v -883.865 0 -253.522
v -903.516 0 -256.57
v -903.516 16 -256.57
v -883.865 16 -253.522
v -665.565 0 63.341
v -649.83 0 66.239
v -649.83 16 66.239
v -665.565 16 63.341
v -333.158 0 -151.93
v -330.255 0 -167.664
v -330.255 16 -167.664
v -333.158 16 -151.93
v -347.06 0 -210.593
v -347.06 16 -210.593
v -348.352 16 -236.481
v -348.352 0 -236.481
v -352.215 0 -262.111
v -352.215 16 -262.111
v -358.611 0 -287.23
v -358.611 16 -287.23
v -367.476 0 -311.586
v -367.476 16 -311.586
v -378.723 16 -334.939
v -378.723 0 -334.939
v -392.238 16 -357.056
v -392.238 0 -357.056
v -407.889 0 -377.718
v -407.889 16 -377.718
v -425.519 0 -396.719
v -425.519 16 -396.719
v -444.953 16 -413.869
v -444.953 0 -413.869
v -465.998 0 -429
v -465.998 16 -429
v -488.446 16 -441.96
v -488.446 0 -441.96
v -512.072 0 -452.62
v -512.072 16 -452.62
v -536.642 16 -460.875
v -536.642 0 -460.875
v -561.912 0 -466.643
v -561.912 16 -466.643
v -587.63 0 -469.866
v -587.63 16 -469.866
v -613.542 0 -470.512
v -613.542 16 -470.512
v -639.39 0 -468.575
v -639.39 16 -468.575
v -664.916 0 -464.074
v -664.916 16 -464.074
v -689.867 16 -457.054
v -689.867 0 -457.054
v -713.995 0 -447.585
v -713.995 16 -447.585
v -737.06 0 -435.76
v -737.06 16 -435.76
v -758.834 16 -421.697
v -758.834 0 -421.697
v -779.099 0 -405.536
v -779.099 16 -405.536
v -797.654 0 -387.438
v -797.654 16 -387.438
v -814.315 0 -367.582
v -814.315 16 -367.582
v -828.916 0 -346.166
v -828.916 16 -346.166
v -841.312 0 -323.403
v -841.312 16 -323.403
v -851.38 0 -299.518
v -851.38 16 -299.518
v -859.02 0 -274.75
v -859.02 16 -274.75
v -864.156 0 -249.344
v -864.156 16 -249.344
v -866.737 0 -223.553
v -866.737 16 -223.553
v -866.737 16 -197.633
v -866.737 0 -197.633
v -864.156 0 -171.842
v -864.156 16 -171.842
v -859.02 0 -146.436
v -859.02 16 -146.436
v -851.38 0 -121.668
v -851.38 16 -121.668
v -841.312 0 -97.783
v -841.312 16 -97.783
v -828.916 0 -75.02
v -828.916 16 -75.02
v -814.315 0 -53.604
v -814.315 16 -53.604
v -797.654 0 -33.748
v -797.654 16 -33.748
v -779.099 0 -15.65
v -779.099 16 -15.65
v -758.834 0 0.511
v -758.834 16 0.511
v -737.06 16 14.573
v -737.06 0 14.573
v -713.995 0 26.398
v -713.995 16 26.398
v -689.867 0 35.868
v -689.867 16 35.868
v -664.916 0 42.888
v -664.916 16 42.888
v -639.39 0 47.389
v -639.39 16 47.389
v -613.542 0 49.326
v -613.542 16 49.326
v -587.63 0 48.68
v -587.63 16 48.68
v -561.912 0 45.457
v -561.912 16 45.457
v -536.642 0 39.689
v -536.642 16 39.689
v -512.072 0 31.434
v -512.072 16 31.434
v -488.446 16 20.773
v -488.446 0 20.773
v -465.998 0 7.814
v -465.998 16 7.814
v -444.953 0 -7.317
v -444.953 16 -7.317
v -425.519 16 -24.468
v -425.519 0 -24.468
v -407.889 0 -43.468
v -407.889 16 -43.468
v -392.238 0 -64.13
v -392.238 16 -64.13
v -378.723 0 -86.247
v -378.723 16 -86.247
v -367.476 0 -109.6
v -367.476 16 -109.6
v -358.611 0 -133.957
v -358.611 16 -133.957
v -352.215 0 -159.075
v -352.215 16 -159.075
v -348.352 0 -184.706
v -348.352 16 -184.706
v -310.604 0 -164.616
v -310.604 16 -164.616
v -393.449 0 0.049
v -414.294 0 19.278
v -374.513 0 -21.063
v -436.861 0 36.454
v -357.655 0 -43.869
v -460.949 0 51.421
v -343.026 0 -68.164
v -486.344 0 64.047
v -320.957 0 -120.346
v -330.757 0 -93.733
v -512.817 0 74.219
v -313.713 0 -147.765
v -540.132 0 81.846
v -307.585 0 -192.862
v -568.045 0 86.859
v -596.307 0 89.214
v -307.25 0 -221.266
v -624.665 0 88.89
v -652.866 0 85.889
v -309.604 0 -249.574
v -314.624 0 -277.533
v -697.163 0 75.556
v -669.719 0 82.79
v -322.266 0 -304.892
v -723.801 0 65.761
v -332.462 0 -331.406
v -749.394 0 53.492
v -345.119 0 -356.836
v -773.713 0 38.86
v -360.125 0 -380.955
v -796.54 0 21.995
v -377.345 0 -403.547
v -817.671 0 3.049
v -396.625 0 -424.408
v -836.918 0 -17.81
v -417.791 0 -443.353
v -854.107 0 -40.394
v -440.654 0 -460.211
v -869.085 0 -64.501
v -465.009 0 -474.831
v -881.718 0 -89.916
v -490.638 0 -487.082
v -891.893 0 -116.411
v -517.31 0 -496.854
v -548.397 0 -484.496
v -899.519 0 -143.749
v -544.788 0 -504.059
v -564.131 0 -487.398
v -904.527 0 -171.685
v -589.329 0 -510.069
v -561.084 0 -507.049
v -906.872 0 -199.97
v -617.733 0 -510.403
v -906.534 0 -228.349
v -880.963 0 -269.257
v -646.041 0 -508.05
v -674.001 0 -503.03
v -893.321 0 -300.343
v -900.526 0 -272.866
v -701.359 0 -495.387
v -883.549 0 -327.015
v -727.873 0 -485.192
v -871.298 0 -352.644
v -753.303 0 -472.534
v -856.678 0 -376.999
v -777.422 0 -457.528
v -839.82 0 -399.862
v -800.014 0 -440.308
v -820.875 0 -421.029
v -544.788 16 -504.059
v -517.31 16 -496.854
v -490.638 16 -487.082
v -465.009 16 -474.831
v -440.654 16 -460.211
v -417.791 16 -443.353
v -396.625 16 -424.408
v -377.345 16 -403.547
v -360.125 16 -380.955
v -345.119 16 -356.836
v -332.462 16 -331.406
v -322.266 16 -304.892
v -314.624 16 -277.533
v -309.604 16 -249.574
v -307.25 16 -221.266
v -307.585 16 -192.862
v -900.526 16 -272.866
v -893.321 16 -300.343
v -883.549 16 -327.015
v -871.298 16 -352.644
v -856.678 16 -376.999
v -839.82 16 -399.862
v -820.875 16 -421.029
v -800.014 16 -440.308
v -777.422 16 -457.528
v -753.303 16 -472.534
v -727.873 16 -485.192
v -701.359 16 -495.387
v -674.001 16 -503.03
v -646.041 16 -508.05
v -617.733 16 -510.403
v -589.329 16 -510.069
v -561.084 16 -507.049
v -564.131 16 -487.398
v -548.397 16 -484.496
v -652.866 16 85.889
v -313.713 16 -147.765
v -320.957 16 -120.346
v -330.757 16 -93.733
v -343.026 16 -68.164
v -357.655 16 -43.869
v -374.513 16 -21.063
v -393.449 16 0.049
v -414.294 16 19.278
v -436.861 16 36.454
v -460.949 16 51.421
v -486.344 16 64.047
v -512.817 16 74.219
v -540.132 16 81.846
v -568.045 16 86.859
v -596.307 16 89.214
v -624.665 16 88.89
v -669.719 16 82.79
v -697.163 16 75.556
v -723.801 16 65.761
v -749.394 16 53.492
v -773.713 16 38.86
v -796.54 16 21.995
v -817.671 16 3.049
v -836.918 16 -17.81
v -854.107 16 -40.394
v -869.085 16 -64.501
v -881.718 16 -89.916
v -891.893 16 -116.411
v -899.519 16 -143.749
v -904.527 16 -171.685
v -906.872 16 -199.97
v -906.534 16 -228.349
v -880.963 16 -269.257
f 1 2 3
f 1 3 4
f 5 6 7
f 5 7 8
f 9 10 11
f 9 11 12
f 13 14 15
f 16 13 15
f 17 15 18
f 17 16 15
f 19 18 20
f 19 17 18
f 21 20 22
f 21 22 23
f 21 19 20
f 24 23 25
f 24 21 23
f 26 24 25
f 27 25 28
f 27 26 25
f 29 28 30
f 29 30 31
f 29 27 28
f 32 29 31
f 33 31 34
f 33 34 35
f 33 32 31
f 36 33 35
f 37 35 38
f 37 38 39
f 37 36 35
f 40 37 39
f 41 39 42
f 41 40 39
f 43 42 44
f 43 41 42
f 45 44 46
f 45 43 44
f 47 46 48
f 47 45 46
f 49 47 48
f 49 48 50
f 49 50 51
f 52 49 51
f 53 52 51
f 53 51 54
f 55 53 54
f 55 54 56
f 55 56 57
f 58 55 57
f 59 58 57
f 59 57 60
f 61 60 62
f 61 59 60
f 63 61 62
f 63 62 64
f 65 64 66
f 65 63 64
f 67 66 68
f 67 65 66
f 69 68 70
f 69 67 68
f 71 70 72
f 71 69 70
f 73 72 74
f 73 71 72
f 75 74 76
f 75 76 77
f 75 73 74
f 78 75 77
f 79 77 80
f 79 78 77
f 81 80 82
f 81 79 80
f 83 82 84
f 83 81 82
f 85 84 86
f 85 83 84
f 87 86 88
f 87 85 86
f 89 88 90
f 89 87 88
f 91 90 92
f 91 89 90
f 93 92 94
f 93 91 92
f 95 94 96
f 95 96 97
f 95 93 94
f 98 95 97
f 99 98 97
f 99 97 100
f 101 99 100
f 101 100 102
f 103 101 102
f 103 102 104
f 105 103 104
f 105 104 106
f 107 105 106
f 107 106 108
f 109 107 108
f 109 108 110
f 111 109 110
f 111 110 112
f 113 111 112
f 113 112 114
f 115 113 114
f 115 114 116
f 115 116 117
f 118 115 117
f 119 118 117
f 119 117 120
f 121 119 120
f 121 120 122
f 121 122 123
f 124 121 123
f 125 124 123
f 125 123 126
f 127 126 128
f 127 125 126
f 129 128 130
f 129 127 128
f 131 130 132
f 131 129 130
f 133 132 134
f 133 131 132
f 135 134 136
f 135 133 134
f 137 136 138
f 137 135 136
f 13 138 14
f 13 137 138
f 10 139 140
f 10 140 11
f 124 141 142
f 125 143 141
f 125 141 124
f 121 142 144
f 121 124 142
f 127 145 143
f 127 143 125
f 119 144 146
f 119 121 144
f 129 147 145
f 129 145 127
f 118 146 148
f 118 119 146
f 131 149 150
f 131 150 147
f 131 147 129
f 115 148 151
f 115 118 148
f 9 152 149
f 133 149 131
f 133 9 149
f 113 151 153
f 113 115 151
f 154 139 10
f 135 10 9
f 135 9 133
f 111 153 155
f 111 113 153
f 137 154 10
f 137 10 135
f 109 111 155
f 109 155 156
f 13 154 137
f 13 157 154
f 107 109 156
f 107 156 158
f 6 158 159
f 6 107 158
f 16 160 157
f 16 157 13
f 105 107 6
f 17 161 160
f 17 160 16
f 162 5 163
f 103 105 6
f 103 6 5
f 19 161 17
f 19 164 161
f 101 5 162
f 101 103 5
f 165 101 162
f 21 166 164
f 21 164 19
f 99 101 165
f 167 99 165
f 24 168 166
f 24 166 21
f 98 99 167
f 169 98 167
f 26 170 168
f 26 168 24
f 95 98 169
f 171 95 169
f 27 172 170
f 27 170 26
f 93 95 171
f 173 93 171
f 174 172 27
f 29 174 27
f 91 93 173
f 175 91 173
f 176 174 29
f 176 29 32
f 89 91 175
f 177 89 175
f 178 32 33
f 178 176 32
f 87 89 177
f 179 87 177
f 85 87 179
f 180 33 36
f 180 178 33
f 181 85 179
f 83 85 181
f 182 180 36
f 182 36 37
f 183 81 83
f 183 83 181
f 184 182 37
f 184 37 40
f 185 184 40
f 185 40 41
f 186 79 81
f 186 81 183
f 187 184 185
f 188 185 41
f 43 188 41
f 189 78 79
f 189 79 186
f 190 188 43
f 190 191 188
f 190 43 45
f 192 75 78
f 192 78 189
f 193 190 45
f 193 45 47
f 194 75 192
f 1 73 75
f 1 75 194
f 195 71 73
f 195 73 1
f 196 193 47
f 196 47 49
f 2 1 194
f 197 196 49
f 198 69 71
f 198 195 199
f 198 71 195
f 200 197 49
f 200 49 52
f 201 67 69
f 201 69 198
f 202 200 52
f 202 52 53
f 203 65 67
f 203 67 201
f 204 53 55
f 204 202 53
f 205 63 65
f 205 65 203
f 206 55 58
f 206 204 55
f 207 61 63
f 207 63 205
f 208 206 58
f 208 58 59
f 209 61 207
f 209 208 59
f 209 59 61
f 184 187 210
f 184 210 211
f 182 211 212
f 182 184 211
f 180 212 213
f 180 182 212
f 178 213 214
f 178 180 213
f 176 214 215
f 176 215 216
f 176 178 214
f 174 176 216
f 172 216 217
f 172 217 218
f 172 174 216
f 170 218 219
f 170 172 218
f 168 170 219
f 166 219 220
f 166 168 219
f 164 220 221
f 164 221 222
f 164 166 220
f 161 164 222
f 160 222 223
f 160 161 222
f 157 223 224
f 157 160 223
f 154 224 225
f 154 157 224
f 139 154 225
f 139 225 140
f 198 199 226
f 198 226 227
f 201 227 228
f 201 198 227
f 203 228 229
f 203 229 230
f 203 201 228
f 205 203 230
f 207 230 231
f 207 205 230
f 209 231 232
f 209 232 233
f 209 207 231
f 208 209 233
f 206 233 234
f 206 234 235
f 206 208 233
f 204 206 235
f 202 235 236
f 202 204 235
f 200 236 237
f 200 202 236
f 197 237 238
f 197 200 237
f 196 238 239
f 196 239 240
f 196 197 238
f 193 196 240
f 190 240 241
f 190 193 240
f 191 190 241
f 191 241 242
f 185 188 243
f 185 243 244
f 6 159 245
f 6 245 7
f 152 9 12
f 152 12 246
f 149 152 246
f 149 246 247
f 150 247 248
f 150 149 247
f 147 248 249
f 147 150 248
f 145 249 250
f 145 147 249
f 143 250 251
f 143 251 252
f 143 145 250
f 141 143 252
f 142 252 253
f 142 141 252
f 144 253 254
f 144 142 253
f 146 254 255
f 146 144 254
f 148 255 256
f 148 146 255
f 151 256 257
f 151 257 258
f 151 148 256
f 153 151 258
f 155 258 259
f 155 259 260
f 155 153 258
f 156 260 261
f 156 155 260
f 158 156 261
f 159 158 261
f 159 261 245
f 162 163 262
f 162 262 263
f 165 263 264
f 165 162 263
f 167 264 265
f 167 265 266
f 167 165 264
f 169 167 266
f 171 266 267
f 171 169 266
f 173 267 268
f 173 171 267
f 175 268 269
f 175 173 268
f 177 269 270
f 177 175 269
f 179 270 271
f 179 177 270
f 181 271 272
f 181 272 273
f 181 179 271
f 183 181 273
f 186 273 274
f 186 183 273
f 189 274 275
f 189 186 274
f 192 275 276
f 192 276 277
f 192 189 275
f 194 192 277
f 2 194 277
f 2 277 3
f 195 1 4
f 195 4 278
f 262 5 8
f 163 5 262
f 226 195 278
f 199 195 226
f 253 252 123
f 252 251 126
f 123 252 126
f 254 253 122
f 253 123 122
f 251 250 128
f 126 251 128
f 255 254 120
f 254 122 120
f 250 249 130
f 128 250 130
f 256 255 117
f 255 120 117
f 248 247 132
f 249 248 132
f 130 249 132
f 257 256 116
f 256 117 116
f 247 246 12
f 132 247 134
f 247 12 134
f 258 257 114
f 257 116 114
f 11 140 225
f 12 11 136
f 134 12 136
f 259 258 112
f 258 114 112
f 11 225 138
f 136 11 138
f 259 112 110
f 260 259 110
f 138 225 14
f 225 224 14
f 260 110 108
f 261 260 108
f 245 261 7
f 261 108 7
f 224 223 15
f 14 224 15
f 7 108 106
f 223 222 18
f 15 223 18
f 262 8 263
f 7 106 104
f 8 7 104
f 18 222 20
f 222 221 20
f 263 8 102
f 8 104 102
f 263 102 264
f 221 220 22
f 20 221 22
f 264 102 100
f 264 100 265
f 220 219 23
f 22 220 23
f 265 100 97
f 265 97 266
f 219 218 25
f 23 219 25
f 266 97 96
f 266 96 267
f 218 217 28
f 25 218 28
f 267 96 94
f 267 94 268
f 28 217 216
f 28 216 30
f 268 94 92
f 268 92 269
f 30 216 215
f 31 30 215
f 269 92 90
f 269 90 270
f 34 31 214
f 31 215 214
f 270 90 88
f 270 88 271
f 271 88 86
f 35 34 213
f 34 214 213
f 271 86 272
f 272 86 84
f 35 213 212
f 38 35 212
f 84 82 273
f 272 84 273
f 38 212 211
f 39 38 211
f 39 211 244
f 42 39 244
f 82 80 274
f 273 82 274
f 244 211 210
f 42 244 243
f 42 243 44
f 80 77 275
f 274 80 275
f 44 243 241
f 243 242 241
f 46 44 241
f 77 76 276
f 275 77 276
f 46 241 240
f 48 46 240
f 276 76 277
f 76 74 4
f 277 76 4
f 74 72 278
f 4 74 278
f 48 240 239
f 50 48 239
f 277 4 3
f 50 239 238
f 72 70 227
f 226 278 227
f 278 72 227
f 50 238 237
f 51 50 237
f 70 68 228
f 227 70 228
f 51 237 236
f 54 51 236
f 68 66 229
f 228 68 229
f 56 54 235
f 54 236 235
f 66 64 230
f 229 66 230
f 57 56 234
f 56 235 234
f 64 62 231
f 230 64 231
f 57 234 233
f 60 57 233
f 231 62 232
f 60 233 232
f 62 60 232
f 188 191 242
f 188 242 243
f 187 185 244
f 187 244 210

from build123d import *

# Parameters (mm, degrees)
SKETCH_1_R      = 260
EXTRUDE_3_DEPTH = 16


with BuildPart() as part:
    # Эскиз1 → Бобышка-Вытянуть3 (new body)
    with BuildSketch(Plane(origin=(0, 0, 0), x_dir=(1, 0, 0), z_dir=(0, 1, 0))):
        with BuildLine():
            Line((-564.131109826, 487.398330281), (-548.396606244, 484.495676837))
            Line((-548.396606244, 484.495676837), (-544.787643902, 504.058890969))
            ThreePointArc((-544.787643902, 504.058890969), (-360.125373537, 380.954998191), (-310.604335978, 164.61639934))
            Line((-310.604335978, 164.61639934), (-330.255153903, 167.66400738))
            Line((-330.255153903, 167.66400738), (-333.157807348, 151.929503798))
            Line((-333.157807348, 151.929503798), (-313.713053206, 147.764879413))
            ThreePointArc((-313.713053206, 147.764879413), (-436.861002003, -36.453770733), (-652.865766443, -85.889285226))
            Line((-652.865766443, -85.889285226), (-649.829869088, -66.239005386))
            Line((-649.829869088, -66.239005386), (-665.565211025, -63.340900125))
            Line((-665.565211025, -63.340900125), (-669.719078569, -82.790306674))
            ThreePointArc((-669.719078569, -82.790306674), (-854.107254512, 40.393898968), (-903.516250652, 256.569982398))
            Line((-903.516250652, 256.569982398), (-883.865432727, 253.522374358))
            Line((-883.865432727, 253.522374358), (-880.962779283, 269.256877941))
            Line((-880.962779283, 269.256877941), (-900.525993415, 272.865840282))
            ThreePointArc((-900.525993415, 272.865840282), (-777.422100637, 457.528110648), (-561.083501786, 507.049148206))
            Line((-561.083501786, 507.049148206), (-564.131109826, 487.398330281))
        make_face()
        with Locations((-607.060293315, 210.593190869)):
            Circle(SKETCH_1_R, mode=Mode.SUBTRACT)
    extrude(amount=EXTRUDE_3_DEPTH)


solid = part.part
